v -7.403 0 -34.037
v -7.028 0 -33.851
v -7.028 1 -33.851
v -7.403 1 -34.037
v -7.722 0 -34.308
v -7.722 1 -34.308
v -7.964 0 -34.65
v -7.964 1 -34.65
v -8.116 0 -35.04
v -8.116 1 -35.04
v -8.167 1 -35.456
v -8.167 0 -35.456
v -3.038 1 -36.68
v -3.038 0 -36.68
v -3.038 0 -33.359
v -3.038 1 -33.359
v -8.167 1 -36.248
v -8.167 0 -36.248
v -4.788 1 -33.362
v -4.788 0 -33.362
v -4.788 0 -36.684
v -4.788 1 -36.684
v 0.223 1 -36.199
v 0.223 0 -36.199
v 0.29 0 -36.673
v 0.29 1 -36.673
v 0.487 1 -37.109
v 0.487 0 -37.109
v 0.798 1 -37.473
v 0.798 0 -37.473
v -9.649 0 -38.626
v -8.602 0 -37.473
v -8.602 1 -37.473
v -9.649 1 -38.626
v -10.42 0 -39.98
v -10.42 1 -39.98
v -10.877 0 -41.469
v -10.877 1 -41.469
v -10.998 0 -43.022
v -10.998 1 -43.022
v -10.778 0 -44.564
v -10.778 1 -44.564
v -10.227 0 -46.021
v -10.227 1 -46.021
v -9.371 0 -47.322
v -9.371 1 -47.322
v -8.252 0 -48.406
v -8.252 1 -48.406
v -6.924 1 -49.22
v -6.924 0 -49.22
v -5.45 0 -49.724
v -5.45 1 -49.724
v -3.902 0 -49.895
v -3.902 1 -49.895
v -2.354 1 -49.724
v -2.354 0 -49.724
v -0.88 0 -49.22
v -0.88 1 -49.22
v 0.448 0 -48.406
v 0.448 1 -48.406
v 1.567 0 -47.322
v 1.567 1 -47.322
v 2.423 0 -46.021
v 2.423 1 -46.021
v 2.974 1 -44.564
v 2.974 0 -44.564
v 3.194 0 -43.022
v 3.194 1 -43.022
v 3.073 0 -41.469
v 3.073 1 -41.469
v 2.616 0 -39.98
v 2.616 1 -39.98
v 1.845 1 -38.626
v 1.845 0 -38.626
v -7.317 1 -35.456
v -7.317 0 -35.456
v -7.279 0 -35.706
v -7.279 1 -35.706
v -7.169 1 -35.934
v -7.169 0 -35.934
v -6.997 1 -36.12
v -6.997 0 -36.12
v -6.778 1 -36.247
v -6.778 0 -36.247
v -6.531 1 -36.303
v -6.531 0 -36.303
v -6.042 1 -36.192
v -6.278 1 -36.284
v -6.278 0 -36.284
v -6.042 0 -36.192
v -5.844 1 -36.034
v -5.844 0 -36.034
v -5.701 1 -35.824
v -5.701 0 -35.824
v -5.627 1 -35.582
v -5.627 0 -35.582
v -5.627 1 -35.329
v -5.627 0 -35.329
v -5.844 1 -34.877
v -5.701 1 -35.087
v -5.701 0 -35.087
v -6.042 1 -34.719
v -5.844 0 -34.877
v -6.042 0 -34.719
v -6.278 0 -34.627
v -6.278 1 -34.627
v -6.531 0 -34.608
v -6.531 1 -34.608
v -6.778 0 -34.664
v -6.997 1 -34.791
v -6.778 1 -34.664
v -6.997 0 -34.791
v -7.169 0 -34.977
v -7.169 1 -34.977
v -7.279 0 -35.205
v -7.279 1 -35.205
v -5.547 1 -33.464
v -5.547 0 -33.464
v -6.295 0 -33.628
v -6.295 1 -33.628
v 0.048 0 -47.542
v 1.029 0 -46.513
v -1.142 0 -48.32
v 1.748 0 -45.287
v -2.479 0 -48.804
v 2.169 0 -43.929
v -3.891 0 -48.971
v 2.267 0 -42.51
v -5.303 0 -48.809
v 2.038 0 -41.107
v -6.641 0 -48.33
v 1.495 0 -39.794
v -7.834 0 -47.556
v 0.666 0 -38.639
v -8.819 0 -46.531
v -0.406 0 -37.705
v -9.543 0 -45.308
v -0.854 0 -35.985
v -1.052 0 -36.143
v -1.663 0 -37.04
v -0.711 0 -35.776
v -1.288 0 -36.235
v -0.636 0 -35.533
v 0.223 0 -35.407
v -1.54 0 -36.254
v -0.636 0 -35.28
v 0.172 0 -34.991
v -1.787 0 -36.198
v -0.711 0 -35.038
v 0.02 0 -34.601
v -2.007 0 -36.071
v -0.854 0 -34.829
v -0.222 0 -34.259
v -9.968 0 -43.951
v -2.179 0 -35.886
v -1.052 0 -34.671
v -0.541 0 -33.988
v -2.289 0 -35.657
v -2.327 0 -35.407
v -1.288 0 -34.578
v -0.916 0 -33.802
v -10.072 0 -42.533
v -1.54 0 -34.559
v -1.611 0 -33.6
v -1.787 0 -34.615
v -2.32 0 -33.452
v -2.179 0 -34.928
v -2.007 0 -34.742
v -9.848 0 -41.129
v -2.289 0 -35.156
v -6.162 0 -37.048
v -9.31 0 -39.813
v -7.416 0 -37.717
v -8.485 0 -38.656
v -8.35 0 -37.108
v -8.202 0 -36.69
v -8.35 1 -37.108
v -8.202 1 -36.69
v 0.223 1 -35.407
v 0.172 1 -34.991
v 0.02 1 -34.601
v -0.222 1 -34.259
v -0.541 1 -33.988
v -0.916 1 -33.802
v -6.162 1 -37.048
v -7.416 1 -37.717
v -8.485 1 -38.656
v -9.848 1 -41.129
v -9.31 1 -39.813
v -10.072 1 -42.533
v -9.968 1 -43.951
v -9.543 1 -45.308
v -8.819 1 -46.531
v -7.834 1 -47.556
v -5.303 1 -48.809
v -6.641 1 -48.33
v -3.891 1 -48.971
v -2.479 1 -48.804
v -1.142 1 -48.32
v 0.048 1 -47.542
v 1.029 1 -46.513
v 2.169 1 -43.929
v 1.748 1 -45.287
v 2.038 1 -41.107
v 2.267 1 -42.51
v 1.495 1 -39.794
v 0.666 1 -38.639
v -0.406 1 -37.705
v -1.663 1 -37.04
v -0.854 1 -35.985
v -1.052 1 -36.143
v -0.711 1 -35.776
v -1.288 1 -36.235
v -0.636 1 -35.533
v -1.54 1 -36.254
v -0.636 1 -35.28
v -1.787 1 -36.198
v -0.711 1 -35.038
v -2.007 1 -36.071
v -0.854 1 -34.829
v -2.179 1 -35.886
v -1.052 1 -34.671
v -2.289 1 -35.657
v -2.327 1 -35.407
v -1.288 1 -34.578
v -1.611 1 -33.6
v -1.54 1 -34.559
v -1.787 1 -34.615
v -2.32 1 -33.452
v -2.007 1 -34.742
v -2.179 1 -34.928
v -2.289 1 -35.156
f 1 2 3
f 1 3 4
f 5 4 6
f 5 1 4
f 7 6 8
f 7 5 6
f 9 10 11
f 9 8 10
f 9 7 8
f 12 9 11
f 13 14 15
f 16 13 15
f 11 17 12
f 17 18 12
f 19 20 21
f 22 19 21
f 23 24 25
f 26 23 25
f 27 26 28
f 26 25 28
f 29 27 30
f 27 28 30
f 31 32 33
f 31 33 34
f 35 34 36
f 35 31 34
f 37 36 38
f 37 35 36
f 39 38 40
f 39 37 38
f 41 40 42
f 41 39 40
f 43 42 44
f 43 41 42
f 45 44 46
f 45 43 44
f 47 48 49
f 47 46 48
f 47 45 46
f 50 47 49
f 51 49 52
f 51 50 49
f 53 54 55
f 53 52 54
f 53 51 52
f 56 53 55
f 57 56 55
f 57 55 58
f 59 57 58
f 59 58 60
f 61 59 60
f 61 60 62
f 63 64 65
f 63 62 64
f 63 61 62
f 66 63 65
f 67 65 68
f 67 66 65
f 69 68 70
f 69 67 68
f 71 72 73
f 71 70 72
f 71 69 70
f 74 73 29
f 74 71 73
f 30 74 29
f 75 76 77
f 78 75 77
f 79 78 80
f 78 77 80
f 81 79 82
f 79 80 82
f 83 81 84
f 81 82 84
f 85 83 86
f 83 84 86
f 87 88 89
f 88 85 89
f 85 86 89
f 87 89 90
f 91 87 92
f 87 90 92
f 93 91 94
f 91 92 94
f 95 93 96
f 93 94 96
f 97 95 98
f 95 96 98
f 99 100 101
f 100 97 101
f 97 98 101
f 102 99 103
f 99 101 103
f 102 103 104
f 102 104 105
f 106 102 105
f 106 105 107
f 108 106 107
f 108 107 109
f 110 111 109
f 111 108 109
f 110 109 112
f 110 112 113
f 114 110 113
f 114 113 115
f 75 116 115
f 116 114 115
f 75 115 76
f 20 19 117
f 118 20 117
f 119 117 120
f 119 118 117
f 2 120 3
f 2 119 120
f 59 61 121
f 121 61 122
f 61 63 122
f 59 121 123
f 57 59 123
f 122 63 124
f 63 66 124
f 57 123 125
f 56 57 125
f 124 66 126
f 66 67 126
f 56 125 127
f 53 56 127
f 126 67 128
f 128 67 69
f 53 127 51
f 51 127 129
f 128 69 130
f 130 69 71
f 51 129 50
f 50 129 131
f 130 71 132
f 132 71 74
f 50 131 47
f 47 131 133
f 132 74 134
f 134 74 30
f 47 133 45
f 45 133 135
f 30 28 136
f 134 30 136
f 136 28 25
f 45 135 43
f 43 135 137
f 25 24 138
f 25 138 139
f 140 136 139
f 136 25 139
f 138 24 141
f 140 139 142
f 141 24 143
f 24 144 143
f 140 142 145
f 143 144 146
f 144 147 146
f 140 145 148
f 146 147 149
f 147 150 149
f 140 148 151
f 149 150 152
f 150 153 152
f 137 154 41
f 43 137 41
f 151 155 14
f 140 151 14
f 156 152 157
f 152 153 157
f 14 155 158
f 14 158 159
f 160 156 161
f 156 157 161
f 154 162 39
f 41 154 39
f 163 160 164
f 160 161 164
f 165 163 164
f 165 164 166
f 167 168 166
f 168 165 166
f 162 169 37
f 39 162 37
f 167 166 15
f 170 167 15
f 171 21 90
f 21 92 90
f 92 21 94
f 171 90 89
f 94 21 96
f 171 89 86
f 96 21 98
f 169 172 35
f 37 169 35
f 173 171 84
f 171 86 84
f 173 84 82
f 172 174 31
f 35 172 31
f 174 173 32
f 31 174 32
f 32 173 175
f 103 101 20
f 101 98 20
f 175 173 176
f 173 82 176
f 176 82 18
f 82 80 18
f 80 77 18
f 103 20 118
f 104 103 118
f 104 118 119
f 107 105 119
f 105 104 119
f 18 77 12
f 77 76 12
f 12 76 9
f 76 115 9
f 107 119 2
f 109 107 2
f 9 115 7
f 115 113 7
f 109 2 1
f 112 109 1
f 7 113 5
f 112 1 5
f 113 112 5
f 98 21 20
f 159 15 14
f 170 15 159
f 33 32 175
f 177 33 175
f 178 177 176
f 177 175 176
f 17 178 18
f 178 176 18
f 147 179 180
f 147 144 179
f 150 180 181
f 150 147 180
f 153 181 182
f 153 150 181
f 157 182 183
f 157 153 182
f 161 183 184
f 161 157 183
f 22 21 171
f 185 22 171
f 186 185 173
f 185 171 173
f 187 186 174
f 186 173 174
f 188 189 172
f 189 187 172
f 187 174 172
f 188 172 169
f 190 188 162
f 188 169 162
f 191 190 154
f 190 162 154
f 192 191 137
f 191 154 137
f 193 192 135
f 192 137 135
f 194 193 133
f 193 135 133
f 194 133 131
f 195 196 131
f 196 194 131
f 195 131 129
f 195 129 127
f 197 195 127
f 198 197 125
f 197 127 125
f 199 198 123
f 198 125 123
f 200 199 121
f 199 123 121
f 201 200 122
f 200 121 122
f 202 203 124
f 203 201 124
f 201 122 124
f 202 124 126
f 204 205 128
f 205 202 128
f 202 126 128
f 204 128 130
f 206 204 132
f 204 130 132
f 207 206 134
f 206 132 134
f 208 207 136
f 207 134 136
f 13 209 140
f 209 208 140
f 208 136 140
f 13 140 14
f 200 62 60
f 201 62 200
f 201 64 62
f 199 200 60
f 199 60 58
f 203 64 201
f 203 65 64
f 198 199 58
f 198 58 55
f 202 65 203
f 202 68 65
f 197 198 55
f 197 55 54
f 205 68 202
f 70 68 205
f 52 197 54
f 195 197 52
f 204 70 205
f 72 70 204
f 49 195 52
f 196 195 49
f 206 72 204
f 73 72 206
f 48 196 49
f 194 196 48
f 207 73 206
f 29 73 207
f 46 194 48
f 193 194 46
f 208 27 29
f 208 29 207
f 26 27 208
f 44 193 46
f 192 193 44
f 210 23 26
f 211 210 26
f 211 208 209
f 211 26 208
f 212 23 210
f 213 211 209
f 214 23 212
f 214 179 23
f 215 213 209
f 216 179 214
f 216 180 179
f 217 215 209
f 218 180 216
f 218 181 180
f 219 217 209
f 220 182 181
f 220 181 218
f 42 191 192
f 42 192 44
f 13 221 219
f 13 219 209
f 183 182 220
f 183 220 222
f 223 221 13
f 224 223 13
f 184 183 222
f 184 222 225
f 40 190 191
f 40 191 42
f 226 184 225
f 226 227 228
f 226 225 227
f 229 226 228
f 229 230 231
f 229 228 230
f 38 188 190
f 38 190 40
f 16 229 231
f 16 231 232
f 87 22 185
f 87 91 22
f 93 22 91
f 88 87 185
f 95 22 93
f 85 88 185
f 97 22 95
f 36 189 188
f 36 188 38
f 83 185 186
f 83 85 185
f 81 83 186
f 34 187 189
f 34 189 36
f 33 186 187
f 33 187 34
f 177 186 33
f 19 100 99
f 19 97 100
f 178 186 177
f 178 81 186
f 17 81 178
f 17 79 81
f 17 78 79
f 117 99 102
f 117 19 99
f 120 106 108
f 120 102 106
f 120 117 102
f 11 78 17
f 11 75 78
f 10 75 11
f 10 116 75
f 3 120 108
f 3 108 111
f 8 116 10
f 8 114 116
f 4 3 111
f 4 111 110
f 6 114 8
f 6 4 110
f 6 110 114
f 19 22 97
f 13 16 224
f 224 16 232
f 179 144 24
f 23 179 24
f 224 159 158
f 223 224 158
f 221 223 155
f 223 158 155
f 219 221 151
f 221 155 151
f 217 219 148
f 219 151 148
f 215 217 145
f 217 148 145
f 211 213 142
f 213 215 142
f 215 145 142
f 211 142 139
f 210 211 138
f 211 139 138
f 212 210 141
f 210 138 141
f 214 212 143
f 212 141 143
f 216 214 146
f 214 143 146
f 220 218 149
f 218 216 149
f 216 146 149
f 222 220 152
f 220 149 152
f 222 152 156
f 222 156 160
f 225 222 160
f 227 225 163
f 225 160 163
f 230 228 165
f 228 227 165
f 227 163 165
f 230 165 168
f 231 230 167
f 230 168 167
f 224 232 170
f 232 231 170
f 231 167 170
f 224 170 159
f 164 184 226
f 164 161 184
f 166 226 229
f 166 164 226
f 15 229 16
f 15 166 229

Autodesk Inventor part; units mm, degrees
ref_plane "YZ Plane" through (0, 0, 0) normal (1, 0, 0) x (0, 1, 0)
ref_plane "XZ Plane" through (0, 0, 0) normal (0, 1, 0) x (-1, 0, 0)
ref_plane "XY Plane" through (0, 0, 0) normal (0, 0, 1) x (1, 0, 0)
sketch "Sketch1" plane through (0, 0, 0) normal (0, 1, 0) x (-1, 0, 0)
  line L0 (4.788, -33.3618) -> (4.788, -36.6836)
  line L1 (8.1671, -36.2479) -> (8.1671, -35.4556)
  line L2 (-0.2231, -35.4067) -> (-0.2231, -36.199)
  line L3 (3.0381, -36.6804) -> (3.0381, -33.3586)
  circle A0 centre (6.4671, -35.4556) radius 0.85
  circle A1 centre (1.4769, -35.4067) radius 0.85
  arc A2 (3.0381, -36.6804) -> (4.788, -36.6836) centre (3.9019, -42.7951) ccw
  arc A3 (7.028, -33.8508) -> (4.788, -33.3618) centre (3.9019, -42.7951) ccw
  arc A4 (8.1671, -35.4556) -> (7.028, -33.8508) centre (6.4671, -35.4556) ccw
  arc A5 (8.1671, -36.2479) -> (8.6017, -37.4732) centre (9.8649, -36.3356) ccw
  arc A6 (-0.7978, -37.4732) -> (8.6017, -37.4732) centre (3.9019, -42.7951) ccw
  arc A7 (-0.7978, -37.4732) -> (-0.2231, -36.199) centre (-1.9231, -36.199) ccw
  arc A8 (0.9161, -33.8019) -> (-0.2231, -35.4067) centre (1.4769, -35.4067) ccw
  arc A9 (3.0381, -33.3586) -> (0.9161, -33.8019) centre (3.9019, -42.7951) ccw
  point P0 (0, 0)
  dimension "d0" = 0
  dimension "d1" = 0
  dimension "d2" = 0
  dimension "d3" = 0
  dimension "d4" = 6.1754
  dimension "d5" = 7.1
  dimension "d6" = 1.7
  dimension "d7" = 1.7
  dimension "d8" = 1.7
  dimension "d9" = 1.7
  dimension "d10" = 1.7
  dimension "d11" = 1.7
  dimension "d12" = 9.476
  dimension "d13" = 9.4748
  dimension "d14" = 1.7499
extrude "Extrusion1" add sketch "Sketch1" along normal blind 1
properties part number "49-01-004"
